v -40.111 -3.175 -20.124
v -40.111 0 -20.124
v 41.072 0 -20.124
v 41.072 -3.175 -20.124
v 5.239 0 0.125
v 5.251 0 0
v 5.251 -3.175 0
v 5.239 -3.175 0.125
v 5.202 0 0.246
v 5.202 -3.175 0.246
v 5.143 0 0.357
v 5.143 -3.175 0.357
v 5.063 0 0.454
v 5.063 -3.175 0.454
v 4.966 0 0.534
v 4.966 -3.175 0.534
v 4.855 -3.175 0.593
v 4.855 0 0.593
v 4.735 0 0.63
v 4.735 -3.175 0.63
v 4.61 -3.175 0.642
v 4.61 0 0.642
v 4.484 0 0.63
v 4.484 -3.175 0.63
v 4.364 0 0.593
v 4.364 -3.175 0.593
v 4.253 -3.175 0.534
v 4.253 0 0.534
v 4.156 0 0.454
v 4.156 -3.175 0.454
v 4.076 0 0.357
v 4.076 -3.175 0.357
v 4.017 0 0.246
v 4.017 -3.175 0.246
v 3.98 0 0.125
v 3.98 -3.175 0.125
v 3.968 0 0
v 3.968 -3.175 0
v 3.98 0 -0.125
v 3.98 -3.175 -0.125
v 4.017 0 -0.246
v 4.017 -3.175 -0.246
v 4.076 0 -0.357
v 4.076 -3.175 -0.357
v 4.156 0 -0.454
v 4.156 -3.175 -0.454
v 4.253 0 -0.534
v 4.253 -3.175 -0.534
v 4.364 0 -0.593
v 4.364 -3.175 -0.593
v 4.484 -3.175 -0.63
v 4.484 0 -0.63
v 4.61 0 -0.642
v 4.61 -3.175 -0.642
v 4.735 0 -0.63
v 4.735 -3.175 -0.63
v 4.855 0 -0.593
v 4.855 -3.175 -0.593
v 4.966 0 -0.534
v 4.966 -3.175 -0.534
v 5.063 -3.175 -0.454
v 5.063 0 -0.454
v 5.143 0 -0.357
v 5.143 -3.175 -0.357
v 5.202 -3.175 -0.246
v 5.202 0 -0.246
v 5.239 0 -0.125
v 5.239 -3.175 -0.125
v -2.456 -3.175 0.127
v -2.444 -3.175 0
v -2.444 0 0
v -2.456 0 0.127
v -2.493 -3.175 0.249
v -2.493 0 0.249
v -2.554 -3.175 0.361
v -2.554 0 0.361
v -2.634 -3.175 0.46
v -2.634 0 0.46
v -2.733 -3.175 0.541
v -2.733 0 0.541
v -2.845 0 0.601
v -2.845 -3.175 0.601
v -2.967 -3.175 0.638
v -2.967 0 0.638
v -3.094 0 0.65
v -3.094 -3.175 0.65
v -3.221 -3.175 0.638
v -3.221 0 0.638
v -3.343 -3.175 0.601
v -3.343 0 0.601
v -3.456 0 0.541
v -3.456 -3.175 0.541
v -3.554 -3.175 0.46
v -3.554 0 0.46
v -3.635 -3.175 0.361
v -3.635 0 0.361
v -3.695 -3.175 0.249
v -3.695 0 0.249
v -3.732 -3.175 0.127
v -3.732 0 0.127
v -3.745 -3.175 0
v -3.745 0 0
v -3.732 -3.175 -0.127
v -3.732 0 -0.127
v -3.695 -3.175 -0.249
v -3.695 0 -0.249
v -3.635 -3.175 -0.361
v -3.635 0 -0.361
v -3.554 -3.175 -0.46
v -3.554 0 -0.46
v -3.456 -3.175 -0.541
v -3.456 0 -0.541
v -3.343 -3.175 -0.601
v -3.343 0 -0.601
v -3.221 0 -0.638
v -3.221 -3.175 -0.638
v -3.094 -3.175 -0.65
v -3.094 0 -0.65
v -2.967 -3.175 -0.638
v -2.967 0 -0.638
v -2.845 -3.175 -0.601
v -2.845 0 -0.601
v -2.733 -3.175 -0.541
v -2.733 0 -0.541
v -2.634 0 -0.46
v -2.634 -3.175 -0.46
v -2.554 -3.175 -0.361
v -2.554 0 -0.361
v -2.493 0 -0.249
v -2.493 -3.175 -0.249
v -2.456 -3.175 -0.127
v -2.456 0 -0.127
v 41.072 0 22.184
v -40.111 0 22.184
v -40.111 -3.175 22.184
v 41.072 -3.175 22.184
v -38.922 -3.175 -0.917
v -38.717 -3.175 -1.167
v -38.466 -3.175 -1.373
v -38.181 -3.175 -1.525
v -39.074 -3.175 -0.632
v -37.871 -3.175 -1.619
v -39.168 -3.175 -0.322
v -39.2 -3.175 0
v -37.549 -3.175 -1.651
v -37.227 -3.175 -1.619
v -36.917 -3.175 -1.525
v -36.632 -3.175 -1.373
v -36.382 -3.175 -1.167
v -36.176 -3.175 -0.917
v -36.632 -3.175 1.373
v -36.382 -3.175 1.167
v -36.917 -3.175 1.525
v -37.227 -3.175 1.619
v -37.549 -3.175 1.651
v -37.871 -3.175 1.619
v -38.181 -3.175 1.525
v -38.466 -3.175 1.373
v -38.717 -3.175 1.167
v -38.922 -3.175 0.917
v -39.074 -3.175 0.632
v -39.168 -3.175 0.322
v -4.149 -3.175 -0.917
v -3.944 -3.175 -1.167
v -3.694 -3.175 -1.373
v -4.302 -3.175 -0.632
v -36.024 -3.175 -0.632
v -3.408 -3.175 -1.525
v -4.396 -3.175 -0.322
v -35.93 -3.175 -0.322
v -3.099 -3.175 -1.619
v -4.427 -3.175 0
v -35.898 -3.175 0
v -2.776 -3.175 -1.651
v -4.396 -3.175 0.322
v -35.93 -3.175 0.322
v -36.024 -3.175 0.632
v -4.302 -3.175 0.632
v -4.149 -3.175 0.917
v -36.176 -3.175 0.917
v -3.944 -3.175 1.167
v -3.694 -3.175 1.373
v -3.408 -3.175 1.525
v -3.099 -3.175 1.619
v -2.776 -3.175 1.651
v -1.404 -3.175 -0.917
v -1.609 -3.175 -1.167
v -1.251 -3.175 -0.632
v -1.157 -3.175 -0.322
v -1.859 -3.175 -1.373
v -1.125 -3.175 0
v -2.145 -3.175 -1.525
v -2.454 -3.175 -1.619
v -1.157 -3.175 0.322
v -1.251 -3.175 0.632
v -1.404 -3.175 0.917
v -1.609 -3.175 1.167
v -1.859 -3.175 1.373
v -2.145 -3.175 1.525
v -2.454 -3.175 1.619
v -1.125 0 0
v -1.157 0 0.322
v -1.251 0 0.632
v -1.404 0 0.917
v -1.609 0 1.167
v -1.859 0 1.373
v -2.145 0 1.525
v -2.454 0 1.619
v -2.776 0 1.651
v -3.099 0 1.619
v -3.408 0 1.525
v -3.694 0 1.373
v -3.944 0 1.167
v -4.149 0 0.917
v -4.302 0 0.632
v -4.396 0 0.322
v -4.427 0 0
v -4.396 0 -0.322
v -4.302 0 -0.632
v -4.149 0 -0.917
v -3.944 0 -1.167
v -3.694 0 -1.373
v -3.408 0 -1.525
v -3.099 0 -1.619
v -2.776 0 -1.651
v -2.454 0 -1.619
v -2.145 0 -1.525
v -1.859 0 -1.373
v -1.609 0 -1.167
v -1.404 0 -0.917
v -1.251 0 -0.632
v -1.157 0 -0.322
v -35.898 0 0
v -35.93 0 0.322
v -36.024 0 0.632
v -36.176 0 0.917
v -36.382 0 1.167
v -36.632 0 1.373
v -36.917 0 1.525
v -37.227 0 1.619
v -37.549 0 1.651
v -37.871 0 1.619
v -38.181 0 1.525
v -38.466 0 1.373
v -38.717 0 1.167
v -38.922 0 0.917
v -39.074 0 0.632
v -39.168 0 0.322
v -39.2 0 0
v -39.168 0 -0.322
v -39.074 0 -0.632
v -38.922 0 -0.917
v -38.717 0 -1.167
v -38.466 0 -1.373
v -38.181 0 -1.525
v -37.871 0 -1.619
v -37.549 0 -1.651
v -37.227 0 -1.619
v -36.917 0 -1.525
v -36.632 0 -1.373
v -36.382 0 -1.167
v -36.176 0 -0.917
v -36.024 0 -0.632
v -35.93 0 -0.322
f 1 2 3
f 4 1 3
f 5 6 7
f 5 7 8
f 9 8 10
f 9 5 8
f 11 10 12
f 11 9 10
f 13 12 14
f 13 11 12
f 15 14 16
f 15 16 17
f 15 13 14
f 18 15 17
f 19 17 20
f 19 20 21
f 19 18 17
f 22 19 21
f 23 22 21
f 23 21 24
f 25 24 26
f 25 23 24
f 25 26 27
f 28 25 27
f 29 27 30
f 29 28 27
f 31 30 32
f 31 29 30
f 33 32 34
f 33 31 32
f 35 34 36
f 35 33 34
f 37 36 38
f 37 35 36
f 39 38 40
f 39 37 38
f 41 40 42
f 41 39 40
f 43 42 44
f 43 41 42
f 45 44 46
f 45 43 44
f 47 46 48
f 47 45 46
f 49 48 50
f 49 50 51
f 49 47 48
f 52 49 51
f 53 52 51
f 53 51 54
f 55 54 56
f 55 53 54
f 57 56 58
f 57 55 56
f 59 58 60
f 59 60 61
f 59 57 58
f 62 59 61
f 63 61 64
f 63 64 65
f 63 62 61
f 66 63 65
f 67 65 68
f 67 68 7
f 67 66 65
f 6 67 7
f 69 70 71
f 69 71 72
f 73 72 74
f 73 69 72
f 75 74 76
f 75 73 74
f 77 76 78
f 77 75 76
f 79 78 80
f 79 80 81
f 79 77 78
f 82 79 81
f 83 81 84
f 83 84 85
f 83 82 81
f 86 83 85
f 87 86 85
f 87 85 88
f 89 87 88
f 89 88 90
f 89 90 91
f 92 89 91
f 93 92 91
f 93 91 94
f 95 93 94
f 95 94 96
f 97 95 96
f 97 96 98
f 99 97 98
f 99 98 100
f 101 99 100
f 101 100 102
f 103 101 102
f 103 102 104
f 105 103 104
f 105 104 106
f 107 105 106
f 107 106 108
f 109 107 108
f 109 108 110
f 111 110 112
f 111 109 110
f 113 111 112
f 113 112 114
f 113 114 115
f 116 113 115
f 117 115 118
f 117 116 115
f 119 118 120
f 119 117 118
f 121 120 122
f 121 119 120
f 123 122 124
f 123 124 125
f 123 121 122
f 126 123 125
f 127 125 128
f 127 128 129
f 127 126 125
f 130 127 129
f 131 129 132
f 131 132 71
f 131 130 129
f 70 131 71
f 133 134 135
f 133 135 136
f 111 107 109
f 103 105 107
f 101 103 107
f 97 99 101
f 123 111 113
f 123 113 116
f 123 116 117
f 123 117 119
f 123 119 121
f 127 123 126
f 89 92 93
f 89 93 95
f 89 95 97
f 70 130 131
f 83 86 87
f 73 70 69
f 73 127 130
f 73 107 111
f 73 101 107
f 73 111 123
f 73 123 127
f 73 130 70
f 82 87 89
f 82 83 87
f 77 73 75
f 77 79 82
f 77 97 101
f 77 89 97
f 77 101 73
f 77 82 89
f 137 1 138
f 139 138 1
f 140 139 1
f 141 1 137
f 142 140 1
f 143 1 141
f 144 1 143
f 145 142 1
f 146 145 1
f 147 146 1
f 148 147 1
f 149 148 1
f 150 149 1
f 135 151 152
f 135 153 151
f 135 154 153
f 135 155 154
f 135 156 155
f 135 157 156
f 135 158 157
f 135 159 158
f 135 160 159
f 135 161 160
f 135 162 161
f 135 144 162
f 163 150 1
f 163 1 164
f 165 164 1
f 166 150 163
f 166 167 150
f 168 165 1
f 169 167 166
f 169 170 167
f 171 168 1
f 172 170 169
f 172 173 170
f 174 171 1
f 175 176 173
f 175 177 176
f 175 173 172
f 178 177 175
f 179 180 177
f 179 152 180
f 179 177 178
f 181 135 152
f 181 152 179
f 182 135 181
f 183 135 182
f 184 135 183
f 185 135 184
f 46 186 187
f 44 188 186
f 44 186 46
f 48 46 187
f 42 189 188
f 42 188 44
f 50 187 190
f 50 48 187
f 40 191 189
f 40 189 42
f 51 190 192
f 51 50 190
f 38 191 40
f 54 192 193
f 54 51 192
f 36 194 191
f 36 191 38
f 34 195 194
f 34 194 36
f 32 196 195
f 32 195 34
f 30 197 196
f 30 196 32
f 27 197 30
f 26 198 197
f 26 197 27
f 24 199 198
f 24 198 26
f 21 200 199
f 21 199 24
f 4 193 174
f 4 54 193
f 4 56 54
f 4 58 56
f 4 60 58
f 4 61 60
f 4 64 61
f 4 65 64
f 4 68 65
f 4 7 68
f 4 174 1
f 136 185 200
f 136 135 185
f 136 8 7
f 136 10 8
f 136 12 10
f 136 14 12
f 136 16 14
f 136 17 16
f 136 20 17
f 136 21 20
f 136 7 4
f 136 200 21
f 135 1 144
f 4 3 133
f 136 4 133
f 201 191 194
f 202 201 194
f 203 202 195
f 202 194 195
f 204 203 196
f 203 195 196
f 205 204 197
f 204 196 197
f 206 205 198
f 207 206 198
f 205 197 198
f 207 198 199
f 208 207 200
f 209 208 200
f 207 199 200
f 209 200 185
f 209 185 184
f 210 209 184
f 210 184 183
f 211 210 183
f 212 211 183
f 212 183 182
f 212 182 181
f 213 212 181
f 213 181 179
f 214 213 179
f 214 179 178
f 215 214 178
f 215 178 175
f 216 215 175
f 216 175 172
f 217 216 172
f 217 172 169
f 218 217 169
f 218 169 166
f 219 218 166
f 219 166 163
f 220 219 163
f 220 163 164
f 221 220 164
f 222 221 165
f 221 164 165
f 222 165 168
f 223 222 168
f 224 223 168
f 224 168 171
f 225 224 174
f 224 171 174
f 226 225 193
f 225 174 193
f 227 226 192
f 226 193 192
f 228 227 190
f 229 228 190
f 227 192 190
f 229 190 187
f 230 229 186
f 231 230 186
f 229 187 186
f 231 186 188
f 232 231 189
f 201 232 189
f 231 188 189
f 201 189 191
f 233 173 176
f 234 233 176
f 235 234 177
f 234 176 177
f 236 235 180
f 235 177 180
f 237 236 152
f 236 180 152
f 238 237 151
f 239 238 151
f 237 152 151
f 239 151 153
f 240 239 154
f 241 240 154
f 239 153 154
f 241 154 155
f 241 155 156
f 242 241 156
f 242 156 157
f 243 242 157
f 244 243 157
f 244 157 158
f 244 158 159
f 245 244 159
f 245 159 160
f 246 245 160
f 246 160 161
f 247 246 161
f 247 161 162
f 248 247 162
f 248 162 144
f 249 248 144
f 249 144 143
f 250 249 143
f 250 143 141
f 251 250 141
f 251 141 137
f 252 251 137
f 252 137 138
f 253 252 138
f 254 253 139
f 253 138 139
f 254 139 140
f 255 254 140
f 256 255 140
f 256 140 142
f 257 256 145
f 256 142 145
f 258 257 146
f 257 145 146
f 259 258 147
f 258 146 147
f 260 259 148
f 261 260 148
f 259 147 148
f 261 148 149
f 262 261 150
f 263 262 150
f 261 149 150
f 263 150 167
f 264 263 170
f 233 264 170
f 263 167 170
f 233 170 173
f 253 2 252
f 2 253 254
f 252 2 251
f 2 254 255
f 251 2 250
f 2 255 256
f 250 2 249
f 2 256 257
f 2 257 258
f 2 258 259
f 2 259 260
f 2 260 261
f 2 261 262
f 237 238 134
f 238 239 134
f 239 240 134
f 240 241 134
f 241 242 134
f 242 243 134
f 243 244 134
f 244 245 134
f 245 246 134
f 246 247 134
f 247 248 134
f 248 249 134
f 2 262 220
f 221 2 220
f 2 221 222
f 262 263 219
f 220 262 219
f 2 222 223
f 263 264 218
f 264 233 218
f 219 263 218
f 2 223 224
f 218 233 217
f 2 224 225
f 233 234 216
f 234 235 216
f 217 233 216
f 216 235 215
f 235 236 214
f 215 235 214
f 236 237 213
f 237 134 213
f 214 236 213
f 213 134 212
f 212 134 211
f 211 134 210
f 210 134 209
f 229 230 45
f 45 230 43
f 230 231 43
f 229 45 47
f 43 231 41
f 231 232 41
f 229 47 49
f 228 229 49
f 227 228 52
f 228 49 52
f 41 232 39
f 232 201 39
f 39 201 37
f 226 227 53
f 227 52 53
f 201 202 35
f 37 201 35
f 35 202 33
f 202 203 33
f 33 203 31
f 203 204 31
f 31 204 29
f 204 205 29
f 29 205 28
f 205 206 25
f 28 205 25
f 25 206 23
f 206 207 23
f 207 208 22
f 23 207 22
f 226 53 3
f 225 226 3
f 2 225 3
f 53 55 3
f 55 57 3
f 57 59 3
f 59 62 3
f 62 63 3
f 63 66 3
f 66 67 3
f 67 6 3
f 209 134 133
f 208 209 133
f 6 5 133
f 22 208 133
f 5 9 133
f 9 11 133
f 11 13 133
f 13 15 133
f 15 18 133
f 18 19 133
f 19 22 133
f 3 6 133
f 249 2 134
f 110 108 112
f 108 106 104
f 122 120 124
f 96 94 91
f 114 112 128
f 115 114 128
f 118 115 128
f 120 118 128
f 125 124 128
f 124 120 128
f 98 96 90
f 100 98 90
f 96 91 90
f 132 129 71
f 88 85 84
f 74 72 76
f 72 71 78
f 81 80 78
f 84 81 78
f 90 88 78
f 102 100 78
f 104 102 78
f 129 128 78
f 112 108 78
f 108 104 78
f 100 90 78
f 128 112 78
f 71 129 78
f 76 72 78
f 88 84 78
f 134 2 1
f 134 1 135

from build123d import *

# Parameters (mm, degrees)
F0_W     = 81.182834
F0_H     = 42.308484
F0_R     = 0.641838
F1_DEPTH = 3.175
F2_R     = 1.651
F2_R_2   = 0.650389
F3_DEPTH = 12.7
F4_DEPTH = 25.4


with BuildPart() as f1:
    # F0 (on Front) → F1 (new body)
    with BuildSketch(Plane.XZ):
        with Locations((0.480777, 1.030238)):
            Rectangle(F0_W, F0_H)
        with Locations((4.609508, 0)):
            Circle(F0_R, mode=Mode.SUBTRACT)
    extrude(amount=F1_DEPTH)

    # F2 (on face) → F3 (cut)
    with BuildSketch(Plane.XZ.offset(3.175)):
        with Locations((-2.776482, 0)):
            Circle(F2_R)
        with Locations((-3.094339, 0)):
            Circle(F2_R_2, mode=Mode.SUBTRACT)
        with Locations((-37.549082, 0)):
            Circle(F2_R)
    extrude(amount=-F3_DEPTH, mode=Mode.SUBTRACT)

    # F0 (on Front) → F4 (cut)
    with BuildSketch(Plane.XZ):
        with Locations((0.480777, 1.030238)):
            Rectangle(F0_W, F0_H)
        with Locations((4.609508, 0)):
            Circle(F0_R, mode=Mode.SUBTRACT)
    extrude(amount=-F4_DEPTH, mode=Mode.SUBTRACT)


solid = f1.part
